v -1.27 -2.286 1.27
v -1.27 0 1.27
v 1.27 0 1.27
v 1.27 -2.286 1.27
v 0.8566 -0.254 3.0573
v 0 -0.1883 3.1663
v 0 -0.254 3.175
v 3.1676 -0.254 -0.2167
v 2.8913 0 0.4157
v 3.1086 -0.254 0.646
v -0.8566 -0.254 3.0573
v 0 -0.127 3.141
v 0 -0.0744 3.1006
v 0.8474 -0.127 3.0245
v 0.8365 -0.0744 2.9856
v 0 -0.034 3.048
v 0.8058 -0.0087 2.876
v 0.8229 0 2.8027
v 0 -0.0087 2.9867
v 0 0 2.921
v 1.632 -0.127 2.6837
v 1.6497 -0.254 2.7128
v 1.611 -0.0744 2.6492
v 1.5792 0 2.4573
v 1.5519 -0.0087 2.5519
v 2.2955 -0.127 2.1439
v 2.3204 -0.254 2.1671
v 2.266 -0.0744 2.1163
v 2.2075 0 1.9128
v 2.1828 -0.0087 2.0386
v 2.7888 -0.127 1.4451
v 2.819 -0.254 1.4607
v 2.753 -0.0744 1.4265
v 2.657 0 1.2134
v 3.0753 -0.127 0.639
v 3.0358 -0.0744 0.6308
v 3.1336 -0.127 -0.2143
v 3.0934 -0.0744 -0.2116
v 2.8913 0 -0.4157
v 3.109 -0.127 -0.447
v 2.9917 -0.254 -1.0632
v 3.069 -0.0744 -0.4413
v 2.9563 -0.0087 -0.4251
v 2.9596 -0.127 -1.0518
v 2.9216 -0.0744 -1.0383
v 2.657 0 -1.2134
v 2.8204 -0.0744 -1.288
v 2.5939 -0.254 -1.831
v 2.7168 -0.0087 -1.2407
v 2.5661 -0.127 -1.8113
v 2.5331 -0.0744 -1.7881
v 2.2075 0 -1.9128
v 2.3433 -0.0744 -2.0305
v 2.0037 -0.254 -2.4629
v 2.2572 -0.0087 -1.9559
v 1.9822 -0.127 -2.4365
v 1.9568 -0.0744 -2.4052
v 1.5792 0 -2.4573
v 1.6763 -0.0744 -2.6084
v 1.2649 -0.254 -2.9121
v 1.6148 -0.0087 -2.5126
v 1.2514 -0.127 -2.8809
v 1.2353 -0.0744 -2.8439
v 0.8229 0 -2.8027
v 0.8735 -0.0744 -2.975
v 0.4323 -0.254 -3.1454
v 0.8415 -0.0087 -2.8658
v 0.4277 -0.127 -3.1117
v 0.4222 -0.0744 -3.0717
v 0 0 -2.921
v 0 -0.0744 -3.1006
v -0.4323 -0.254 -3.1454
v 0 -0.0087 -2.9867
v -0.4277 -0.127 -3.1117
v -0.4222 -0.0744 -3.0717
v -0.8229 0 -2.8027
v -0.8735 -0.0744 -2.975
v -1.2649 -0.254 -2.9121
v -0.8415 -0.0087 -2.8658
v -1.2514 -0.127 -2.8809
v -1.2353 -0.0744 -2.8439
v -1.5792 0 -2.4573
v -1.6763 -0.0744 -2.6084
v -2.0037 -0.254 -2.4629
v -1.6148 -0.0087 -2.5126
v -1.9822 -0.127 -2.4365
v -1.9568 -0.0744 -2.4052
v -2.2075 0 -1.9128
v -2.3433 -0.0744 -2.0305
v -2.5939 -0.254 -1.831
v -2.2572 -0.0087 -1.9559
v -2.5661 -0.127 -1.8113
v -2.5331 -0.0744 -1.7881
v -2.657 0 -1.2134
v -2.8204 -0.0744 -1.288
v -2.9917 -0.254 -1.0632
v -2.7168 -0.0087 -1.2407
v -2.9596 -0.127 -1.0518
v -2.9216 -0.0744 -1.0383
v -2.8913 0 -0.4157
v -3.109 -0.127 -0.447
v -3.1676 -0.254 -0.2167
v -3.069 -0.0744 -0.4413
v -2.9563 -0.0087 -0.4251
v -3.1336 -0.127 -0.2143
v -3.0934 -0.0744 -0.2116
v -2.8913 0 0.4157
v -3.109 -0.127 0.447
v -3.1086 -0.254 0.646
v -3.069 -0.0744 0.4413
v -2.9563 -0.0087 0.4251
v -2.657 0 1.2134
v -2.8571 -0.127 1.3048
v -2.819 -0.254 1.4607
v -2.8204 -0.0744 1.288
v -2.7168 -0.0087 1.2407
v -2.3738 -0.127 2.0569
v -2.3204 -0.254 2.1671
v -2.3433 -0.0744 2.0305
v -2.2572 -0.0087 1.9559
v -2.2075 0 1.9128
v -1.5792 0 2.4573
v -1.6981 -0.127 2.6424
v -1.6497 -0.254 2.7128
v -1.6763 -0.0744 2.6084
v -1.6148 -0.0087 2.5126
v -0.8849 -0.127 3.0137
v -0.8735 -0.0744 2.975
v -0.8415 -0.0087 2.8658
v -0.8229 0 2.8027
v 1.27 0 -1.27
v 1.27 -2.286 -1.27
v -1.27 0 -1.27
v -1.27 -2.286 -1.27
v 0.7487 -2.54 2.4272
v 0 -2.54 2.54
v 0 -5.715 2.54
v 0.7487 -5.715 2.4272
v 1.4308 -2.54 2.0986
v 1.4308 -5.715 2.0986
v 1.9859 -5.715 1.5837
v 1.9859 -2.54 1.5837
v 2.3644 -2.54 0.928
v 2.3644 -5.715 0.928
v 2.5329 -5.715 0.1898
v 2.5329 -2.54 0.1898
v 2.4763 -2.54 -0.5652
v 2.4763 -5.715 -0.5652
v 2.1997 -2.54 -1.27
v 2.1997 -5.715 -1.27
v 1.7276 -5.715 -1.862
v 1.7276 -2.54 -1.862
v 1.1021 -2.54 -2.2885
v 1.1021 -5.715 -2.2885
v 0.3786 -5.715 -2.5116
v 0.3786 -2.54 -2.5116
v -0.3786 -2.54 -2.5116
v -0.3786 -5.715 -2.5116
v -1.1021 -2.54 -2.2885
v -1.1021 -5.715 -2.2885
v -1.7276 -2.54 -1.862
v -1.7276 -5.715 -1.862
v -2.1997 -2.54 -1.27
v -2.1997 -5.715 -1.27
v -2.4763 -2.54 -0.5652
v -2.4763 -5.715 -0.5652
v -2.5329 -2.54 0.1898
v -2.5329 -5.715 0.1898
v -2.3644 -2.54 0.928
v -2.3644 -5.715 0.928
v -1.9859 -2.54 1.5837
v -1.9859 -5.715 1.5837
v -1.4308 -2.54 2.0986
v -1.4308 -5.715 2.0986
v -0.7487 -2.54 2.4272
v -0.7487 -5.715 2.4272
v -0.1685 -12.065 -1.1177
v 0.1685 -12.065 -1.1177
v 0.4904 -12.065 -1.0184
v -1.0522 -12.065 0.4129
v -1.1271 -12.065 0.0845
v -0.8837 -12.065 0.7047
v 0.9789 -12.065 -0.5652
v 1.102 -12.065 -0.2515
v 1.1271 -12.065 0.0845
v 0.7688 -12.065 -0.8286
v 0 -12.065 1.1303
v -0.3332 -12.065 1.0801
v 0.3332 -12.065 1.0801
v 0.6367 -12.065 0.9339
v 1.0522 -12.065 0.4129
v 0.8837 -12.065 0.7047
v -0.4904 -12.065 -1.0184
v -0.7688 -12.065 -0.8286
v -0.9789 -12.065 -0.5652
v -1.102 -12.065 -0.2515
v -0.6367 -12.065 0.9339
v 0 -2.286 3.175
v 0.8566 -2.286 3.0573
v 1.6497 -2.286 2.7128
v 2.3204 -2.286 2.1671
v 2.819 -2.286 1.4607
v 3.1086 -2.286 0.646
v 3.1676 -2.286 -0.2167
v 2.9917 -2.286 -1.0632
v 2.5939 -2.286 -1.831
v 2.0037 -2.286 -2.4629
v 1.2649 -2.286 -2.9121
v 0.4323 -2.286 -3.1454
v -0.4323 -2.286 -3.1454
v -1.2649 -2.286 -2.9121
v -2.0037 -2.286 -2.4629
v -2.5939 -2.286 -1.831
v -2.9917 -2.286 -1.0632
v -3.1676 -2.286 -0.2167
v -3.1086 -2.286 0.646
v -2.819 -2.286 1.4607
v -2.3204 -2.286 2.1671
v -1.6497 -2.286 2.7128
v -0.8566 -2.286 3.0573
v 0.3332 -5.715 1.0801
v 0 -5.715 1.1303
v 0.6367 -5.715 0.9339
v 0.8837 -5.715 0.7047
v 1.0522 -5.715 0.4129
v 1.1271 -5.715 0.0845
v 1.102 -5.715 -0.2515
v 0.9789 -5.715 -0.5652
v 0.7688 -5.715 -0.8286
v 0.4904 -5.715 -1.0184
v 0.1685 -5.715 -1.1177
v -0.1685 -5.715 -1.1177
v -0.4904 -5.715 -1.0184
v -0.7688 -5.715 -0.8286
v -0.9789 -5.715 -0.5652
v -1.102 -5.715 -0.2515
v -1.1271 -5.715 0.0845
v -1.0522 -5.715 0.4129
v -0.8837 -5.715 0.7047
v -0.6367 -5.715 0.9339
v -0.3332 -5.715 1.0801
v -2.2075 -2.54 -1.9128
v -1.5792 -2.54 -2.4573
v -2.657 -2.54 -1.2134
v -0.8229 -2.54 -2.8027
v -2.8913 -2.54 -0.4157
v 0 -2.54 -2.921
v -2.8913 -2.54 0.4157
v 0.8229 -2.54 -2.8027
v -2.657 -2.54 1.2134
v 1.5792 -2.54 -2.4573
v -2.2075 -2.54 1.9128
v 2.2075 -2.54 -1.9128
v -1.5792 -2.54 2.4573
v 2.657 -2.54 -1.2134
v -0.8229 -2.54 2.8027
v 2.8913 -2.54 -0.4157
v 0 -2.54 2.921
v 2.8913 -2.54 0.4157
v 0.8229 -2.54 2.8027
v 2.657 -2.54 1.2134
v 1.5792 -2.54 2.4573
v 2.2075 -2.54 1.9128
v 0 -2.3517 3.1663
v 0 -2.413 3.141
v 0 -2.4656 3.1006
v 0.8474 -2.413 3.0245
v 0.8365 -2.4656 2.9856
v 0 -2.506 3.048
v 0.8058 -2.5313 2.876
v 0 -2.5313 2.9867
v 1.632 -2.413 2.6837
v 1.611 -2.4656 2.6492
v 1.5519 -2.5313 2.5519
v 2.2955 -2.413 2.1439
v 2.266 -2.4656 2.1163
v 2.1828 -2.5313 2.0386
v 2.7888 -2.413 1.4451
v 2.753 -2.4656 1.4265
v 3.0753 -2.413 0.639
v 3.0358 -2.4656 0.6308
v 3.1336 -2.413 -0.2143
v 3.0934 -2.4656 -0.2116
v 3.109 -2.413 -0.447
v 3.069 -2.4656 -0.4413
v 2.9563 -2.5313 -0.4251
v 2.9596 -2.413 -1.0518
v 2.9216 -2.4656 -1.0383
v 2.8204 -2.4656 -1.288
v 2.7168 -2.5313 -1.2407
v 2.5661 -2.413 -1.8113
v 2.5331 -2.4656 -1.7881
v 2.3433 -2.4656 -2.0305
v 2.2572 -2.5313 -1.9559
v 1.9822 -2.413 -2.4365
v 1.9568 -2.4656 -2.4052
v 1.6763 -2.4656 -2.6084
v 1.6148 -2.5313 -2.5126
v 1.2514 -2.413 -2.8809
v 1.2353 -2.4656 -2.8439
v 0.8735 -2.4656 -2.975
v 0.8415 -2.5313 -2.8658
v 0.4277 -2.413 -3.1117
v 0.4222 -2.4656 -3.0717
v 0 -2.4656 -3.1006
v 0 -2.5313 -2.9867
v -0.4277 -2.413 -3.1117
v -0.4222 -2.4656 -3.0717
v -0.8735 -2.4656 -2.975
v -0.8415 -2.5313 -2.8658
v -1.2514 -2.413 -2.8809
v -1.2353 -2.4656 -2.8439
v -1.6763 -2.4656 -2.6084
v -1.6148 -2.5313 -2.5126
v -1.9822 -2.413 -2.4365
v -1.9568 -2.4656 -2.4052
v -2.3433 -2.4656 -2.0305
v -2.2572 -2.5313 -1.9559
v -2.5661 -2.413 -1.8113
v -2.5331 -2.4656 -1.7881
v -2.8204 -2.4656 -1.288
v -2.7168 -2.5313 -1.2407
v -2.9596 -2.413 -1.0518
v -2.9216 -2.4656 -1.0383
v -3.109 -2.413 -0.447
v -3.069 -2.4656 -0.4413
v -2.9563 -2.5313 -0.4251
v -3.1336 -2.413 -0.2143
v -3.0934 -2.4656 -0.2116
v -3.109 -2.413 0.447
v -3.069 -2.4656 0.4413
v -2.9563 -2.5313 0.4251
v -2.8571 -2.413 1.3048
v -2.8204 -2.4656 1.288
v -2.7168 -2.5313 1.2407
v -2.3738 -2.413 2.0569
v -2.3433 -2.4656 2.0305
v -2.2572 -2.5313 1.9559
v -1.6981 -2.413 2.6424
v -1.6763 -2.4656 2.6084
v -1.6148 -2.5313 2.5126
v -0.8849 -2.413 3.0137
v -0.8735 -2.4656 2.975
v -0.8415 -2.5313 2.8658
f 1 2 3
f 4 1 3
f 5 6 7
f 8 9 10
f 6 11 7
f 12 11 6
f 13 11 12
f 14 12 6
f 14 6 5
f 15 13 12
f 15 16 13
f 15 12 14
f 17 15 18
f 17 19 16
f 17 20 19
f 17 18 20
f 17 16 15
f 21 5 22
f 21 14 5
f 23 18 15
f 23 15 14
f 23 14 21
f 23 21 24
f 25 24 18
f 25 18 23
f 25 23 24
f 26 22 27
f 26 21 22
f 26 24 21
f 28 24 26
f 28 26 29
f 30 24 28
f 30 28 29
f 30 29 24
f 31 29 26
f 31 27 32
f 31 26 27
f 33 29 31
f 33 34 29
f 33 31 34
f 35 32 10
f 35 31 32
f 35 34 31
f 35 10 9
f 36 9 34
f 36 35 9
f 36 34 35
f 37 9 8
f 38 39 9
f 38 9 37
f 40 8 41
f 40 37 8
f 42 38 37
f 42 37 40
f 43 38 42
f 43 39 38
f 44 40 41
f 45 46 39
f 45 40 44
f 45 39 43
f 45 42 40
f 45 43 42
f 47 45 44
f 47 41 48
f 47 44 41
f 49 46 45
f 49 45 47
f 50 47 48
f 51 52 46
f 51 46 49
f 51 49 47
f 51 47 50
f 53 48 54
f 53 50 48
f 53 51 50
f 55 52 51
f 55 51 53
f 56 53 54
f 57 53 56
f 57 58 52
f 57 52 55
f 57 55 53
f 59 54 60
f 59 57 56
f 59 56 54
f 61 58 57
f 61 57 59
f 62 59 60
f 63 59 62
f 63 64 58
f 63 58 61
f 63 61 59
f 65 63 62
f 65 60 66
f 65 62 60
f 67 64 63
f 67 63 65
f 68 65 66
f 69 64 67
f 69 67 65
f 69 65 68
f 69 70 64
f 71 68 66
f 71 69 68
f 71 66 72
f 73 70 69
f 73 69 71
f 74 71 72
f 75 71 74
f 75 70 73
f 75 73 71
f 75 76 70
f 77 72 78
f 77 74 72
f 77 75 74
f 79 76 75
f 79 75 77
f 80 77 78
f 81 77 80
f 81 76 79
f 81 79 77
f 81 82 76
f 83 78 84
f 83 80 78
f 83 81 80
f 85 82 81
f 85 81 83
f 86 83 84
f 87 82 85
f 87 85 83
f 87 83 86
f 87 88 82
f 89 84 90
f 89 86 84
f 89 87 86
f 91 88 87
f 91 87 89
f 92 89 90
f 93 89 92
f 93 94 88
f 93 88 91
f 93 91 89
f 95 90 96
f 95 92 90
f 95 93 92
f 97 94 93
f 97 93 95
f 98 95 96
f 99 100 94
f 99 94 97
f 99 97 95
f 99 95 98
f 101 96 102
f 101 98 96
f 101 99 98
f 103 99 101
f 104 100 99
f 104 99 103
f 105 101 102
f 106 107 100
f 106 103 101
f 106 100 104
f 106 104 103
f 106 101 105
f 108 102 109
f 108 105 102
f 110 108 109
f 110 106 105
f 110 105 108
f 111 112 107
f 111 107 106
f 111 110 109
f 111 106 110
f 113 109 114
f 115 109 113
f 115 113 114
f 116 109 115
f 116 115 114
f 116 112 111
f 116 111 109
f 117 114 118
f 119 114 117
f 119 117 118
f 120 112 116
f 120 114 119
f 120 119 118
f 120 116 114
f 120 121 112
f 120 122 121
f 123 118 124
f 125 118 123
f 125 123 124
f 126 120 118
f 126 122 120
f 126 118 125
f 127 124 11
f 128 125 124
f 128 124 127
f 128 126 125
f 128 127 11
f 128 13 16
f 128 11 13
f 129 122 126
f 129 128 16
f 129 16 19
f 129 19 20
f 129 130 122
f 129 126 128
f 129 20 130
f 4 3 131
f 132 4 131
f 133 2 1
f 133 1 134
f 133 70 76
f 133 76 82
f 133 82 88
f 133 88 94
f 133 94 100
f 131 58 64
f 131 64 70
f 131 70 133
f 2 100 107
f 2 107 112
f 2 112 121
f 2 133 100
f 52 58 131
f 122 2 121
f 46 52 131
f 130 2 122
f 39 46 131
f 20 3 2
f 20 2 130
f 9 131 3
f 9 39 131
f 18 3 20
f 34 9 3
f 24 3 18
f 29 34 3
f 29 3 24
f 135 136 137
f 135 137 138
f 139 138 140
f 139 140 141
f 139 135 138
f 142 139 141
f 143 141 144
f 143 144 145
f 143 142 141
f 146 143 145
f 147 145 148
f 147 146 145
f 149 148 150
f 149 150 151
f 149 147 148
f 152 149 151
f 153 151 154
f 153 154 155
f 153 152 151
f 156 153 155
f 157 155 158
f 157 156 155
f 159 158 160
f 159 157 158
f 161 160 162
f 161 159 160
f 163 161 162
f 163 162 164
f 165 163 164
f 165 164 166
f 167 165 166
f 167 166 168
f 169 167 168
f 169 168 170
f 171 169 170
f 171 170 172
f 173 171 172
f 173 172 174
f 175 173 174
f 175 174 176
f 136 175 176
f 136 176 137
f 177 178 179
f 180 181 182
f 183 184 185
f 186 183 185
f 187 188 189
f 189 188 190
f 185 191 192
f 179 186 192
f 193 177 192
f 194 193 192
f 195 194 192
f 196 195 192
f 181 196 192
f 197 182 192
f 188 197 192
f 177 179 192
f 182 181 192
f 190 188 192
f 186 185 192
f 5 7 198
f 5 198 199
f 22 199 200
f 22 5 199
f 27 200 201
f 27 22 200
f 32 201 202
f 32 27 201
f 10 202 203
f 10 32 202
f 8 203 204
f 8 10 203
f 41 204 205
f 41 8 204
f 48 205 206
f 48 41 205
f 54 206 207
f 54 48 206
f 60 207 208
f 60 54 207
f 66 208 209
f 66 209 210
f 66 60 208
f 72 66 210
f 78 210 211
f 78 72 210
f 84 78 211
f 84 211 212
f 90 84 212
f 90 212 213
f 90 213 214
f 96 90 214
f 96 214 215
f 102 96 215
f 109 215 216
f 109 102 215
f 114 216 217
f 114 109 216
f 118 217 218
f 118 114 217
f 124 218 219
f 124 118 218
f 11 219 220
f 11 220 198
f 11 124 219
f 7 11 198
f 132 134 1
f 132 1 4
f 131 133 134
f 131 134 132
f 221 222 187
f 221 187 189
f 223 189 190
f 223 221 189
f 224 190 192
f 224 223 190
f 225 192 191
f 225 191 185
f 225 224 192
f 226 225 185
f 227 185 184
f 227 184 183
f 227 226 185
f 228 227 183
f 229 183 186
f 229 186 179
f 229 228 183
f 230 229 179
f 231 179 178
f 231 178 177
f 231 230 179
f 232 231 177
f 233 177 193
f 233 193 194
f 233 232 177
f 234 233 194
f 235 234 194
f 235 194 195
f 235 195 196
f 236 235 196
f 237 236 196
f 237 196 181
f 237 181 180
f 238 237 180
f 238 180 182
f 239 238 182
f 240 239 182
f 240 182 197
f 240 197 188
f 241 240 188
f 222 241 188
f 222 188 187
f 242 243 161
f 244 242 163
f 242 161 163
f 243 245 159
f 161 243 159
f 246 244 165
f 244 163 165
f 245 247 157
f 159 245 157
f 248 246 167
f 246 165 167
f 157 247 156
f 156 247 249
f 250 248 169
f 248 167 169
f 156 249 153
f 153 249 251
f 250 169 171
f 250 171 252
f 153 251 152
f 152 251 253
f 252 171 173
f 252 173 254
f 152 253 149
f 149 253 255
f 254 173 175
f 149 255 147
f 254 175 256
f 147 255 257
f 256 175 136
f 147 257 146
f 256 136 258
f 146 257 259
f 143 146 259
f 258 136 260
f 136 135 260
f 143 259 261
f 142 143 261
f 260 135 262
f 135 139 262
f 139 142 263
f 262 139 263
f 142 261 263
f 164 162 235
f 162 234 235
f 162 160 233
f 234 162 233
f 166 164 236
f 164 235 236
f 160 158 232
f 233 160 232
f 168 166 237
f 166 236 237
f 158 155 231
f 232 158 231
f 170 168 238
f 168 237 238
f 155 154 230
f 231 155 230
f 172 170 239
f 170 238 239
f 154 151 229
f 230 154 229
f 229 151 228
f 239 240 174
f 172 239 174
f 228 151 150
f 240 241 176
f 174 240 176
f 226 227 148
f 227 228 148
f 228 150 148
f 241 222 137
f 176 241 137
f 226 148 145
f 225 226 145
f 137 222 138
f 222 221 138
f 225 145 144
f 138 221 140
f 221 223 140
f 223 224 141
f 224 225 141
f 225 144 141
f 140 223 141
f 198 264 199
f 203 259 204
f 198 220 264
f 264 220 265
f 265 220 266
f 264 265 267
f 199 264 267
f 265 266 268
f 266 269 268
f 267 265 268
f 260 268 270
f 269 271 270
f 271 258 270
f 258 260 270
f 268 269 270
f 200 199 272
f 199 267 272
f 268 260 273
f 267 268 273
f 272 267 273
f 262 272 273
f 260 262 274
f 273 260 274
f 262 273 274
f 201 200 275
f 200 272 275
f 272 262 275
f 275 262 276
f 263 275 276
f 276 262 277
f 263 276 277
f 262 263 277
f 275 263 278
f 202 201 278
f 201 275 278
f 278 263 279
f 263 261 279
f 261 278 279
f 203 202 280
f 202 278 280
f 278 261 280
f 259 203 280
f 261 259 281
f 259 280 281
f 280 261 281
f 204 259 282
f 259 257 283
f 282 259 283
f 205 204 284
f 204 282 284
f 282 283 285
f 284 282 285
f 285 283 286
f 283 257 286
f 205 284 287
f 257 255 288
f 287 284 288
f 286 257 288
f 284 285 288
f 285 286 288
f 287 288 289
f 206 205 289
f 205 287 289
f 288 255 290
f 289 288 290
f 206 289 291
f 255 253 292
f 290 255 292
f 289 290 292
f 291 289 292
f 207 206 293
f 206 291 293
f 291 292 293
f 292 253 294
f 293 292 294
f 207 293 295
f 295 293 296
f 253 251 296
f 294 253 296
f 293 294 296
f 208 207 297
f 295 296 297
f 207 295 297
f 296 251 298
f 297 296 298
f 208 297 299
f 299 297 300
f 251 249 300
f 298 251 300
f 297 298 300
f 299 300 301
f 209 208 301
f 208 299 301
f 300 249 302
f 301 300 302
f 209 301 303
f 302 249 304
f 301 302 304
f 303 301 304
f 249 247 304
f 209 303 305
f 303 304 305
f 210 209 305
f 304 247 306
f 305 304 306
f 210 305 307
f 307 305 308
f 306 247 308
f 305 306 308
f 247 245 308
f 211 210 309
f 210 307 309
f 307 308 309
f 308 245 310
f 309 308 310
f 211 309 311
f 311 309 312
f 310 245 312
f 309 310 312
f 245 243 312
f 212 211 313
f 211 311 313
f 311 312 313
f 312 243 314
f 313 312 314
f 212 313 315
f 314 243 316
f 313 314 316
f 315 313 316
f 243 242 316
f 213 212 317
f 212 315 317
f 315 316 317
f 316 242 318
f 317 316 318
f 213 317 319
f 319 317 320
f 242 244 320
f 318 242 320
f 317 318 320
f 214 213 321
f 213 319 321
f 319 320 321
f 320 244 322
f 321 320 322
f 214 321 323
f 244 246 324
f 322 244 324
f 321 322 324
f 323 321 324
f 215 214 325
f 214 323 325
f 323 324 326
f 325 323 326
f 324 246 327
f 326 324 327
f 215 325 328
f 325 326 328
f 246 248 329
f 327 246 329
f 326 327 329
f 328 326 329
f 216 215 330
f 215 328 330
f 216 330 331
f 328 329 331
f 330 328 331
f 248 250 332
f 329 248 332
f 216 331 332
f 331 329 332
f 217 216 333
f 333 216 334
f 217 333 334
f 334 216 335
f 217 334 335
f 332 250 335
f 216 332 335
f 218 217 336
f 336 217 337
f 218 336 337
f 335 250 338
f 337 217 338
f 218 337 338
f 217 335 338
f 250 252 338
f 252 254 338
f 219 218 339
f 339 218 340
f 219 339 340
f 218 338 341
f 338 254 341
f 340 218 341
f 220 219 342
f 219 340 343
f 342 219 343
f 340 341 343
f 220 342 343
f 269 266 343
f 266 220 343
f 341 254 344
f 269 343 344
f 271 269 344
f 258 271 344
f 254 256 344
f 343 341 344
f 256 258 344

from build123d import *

# Parameters (mm, degrees)
SKETCH1_R           = 2.54
BOSS_EXTRUDE1_DEPTH = 5.715
SKETCH2_R           = 1.1303
BOSS_EXTRUDE2_DEPTH = 12.065
SKETCH4_R           = 3.175
BOSS_EXTRUDE3_DEPTH = 2.54
SKETCH3_W           = 2.54
SKETCH3_H           = 2.54
CUT_EXTRUDE1_DEPTH  = 2.286
FILLET1_R           = 0.254


with BuildPart() as part:
    # Sketch1 → Boss-Extrude1 (new body)
    with BuildSketch(Plane(origin=(0, 0, 0), x_dir=(1, 0, 0), z_dir=(0, 1, 0))):
        with Locations(Location((0, 0, 0), (0, 0, 270))):
            Circle(SKETCH1_R)
    extrude(amount=-BOSS_EXTRUDE1_DEPTH)

    # Sketch2 → Boss-Extrude2 (add)
    with BuildSketch(Plane(origin=(0, 0, 0), x_dir=(1, 0, 0), z_dir=(0, 1, 0))):
        with Locations(Location((0, 0, 0), (0, 0, 270))):
            Circle(SKETCH2_R)
    extrude(amount=-BOSS_EXTRUDE2_DEPTH)

    # Sketch4 → Boss-Extrude3 (add)
    with BuildSketch(Plane(origin=(0, 0, 0), x_dir=(1, 0, 0), z_dir=(0, 1, 0))):
        with Locations(Location((0, 0, 0), (0, 0, 270))):
            Circle(SKETCH4_R)
    extrude(amount=-BOSS_EXTRUDE3_DEPTH)

    # Sketch3 → Cut-Extrude1 (cut)
    with BuildSketch(Plane(origin=(0, 0, 0), x_dir=(1, 0, 0), z_dir=(0, 1, 0))):
        Rectangle(SKETCH3_W, SKETCH3_H)
    extrude(amount=-CUT_EXTRUDE1_DEPTH, mode=Mode.SUBTRACT)

    # Fillet1
    fillet1_edges = [part.edges().sort_by_distance(p)[0] for p in [
        (0, -2.54, -3.175),
        (0, 0, -3.175),
    ]]
    fillet(fillet1_edges, radius=FILLET1_R)


solid = part.part
